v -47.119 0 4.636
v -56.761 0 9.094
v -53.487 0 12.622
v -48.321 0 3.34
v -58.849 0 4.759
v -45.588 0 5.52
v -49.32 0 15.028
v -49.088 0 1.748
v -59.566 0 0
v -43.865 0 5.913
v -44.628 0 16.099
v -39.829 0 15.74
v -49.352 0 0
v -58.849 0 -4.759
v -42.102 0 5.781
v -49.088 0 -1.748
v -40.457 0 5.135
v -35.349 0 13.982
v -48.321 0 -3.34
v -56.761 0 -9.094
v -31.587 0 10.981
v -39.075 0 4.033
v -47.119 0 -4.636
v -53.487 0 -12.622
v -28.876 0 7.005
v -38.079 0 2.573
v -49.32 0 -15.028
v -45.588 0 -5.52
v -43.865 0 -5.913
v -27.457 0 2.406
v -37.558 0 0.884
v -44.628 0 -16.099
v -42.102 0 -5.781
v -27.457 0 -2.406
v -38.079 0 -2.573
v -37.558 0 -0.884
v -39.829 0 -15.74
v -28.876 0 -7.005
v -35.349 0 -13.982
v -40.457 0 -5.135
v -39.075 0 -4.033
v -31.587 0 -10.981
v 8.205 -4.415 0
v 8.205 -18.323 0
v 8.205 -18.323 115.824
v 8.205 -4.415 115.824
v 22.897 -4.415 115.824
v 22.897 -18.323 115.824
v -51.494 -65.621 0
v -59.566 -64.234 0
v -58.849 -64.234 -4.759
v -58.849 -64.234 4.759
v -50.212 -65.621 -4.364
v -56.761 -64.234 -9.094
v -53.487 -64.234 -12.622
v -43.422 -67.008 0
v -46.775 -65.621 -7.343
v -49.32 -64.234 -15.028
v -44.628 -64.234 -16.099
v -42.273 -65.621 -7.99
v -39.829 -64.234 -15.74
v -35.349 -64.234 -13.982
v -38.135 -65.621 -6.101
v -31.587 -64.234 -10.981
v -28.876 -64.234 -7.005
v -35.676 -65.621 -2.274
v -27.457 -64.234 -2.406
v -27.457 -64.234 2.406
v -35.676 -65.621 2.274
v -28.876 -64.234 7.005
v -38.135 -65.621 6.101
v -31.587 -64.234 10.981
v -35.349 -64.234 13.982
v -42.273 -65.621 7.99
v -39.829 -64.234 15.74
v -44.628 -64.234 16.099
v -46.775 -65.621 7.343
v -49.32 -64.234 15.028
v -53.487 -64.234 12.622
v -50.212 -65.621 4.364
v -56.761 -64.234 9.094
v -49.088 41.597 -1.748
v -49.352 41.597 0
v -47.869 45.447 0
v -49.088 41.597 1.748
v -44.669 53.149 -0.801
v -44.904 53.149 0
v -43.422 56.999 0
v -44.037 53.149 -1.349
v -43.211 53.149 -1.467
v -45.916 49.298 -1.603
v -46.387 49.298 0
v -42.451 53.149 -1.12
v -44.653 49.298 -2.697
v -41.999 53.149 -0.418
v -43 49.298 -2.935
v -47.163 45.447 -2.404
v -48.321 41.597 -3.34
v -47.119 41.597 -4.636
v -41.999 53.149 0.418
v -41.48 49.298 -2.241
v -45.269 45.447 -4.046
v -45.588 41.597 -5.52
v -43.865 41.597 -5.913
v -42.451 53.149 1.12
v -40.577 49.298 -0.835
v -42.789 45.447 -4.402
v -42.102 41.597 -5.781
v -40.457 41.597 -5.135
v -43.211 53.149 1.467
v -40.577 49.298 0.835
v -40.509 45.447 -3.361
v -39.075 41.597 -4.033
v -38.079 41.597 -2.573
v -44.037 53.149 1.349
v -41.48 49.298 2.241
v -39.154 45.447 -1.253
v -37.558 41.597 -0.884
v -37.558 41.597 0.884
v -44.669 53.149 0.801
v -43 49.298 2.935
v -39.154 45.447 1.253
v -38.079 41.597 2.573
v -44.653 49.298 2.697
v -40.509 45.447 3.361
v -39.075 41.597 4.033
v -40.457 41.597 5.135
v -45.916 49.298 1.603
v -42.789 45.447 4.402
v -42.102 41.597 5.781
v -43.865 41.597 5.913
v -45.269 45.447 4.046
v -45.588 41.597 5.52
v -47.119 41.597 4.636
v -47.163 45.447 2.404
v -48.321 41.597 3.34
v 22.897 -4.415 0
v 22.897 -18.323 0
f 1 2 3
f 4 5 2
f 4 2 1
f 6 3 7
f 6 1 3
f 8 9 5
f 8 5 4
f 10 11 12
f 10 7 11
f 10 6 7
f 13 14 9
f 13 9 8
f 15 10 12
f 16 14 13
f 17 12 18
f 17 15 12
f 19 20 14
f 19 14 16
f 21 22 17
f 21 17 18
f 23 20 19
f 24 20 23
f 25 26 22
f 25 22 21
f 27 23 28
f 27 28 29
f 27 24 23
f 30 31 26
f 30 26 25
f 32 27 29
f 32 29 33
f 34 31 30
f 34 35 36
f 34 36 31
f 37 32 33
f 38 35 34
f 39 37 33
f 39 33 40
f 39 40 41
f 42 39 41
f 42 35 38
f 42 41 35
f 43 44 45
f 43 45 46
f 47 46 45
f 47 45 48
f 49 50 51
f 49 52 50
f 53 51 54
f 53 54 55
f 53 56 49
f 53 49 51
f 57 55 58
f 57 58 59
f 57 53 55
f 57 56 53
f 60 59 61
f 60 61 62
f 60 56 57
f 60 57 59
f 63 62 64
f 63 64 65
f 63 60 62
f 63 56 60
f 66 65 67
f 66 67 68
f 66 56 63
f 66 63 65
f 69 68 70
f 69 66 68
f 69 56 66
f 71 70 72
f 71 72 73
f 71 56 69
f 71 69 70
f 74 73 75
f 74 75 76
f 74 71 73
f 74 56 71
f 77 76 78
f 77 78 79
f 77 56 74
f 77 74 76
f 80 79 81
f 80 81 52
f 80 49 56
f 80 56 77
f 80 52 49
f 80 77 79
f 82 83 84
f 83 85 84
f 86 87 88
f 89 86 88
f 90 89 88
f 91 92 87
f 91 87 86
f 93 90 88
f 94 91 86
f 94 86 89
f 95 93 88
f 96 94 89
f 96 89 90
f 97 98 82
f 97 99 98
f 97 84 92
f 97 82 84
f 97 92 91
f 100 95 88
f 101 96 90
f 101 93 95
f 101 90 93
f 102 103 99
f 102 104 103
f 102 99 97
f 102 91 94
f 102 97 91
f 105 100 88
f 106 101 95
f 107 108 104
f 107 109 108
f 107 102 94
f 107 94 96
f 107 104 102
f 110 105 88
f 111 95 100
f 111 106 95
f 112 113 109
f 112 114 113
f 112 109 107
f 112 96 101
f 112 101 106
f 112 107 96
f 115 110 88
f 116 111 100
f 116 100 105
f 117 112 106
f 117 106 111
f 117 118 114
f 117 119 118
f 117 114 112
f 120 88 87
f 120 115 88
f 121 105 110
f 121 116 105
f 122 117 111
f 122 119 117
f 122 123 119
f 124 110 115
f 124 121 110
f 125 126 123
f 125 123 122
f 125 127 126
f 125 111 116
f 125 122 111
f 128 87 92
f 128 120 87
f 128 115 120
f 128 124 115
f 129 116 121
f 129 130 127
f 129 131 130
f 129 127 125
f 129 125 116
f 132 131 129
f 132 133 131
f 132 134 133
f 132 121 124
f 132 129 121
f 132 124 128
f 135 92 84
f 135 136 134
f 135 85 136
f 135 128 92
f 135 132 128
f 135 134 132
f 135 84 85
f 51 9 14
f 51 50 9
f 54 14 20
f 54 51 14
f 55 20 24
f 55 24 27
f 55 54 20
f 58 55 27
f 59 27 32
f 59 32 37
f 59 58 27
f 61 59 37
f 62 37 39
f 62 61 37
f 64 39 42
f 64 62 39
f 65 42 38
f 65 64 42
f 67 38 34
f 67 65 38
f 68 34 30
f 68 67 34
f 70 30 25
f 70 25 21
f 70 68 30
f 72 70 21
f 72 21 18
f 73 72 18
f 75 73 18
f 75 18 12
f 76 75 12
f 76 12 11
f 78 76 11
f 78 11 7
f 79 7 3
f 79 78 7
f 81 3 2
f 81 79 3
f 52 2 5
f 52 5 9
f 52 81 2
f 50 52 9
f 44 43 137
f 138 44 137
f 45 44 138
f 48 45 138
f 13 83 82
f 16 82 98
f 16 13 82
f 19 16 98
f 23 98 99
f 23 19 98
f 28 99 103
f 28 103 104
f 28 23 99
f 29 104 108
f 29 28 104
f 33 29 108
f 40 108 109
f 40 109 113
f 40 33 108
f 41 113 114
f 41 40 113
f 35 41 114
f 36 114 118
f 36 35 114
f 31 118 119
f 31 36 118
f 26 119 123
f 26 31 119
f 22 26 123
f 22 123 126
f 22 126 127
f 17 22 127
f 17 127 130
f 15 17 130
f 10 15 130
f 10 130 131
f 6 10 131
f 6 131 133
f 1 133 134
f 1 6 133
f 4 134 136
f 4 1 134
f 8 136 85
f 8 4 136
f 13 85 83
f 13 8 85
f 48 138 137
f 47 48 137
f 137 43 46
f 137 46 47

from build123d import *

# Parameters (mm, degrees)
F2_W     = 14.691623
F2_H     = 13.90826
F3_DEPTH = 115.824


with BuildPart() as f1:
    # F0 (on Top) → F1 (revolve)
    with BuildSketch(Plane.XY):
        Polygon((-59.566047, 0), (-59.566047, -64.233713), (-43.421596, -67.007601), (-43.421596, 56.999426), (-49.351558, 41.596729), (-49.351558, 0), align=None)
    revolve(axis=Axis((-43.421596, -5.004087, 0), (0, -1, 0)))


with BuildPart() as f3:
    # F2 (on Top) → F3 (new body)
    with BuildSketch(Plane.XY):
        with Locations((15.55096, -11.369312)):
            Rectangle(F2_W, F2_H)
    extrude(amount=F3_DEPTH)


solid = Compound([f1.part, f3.part])
